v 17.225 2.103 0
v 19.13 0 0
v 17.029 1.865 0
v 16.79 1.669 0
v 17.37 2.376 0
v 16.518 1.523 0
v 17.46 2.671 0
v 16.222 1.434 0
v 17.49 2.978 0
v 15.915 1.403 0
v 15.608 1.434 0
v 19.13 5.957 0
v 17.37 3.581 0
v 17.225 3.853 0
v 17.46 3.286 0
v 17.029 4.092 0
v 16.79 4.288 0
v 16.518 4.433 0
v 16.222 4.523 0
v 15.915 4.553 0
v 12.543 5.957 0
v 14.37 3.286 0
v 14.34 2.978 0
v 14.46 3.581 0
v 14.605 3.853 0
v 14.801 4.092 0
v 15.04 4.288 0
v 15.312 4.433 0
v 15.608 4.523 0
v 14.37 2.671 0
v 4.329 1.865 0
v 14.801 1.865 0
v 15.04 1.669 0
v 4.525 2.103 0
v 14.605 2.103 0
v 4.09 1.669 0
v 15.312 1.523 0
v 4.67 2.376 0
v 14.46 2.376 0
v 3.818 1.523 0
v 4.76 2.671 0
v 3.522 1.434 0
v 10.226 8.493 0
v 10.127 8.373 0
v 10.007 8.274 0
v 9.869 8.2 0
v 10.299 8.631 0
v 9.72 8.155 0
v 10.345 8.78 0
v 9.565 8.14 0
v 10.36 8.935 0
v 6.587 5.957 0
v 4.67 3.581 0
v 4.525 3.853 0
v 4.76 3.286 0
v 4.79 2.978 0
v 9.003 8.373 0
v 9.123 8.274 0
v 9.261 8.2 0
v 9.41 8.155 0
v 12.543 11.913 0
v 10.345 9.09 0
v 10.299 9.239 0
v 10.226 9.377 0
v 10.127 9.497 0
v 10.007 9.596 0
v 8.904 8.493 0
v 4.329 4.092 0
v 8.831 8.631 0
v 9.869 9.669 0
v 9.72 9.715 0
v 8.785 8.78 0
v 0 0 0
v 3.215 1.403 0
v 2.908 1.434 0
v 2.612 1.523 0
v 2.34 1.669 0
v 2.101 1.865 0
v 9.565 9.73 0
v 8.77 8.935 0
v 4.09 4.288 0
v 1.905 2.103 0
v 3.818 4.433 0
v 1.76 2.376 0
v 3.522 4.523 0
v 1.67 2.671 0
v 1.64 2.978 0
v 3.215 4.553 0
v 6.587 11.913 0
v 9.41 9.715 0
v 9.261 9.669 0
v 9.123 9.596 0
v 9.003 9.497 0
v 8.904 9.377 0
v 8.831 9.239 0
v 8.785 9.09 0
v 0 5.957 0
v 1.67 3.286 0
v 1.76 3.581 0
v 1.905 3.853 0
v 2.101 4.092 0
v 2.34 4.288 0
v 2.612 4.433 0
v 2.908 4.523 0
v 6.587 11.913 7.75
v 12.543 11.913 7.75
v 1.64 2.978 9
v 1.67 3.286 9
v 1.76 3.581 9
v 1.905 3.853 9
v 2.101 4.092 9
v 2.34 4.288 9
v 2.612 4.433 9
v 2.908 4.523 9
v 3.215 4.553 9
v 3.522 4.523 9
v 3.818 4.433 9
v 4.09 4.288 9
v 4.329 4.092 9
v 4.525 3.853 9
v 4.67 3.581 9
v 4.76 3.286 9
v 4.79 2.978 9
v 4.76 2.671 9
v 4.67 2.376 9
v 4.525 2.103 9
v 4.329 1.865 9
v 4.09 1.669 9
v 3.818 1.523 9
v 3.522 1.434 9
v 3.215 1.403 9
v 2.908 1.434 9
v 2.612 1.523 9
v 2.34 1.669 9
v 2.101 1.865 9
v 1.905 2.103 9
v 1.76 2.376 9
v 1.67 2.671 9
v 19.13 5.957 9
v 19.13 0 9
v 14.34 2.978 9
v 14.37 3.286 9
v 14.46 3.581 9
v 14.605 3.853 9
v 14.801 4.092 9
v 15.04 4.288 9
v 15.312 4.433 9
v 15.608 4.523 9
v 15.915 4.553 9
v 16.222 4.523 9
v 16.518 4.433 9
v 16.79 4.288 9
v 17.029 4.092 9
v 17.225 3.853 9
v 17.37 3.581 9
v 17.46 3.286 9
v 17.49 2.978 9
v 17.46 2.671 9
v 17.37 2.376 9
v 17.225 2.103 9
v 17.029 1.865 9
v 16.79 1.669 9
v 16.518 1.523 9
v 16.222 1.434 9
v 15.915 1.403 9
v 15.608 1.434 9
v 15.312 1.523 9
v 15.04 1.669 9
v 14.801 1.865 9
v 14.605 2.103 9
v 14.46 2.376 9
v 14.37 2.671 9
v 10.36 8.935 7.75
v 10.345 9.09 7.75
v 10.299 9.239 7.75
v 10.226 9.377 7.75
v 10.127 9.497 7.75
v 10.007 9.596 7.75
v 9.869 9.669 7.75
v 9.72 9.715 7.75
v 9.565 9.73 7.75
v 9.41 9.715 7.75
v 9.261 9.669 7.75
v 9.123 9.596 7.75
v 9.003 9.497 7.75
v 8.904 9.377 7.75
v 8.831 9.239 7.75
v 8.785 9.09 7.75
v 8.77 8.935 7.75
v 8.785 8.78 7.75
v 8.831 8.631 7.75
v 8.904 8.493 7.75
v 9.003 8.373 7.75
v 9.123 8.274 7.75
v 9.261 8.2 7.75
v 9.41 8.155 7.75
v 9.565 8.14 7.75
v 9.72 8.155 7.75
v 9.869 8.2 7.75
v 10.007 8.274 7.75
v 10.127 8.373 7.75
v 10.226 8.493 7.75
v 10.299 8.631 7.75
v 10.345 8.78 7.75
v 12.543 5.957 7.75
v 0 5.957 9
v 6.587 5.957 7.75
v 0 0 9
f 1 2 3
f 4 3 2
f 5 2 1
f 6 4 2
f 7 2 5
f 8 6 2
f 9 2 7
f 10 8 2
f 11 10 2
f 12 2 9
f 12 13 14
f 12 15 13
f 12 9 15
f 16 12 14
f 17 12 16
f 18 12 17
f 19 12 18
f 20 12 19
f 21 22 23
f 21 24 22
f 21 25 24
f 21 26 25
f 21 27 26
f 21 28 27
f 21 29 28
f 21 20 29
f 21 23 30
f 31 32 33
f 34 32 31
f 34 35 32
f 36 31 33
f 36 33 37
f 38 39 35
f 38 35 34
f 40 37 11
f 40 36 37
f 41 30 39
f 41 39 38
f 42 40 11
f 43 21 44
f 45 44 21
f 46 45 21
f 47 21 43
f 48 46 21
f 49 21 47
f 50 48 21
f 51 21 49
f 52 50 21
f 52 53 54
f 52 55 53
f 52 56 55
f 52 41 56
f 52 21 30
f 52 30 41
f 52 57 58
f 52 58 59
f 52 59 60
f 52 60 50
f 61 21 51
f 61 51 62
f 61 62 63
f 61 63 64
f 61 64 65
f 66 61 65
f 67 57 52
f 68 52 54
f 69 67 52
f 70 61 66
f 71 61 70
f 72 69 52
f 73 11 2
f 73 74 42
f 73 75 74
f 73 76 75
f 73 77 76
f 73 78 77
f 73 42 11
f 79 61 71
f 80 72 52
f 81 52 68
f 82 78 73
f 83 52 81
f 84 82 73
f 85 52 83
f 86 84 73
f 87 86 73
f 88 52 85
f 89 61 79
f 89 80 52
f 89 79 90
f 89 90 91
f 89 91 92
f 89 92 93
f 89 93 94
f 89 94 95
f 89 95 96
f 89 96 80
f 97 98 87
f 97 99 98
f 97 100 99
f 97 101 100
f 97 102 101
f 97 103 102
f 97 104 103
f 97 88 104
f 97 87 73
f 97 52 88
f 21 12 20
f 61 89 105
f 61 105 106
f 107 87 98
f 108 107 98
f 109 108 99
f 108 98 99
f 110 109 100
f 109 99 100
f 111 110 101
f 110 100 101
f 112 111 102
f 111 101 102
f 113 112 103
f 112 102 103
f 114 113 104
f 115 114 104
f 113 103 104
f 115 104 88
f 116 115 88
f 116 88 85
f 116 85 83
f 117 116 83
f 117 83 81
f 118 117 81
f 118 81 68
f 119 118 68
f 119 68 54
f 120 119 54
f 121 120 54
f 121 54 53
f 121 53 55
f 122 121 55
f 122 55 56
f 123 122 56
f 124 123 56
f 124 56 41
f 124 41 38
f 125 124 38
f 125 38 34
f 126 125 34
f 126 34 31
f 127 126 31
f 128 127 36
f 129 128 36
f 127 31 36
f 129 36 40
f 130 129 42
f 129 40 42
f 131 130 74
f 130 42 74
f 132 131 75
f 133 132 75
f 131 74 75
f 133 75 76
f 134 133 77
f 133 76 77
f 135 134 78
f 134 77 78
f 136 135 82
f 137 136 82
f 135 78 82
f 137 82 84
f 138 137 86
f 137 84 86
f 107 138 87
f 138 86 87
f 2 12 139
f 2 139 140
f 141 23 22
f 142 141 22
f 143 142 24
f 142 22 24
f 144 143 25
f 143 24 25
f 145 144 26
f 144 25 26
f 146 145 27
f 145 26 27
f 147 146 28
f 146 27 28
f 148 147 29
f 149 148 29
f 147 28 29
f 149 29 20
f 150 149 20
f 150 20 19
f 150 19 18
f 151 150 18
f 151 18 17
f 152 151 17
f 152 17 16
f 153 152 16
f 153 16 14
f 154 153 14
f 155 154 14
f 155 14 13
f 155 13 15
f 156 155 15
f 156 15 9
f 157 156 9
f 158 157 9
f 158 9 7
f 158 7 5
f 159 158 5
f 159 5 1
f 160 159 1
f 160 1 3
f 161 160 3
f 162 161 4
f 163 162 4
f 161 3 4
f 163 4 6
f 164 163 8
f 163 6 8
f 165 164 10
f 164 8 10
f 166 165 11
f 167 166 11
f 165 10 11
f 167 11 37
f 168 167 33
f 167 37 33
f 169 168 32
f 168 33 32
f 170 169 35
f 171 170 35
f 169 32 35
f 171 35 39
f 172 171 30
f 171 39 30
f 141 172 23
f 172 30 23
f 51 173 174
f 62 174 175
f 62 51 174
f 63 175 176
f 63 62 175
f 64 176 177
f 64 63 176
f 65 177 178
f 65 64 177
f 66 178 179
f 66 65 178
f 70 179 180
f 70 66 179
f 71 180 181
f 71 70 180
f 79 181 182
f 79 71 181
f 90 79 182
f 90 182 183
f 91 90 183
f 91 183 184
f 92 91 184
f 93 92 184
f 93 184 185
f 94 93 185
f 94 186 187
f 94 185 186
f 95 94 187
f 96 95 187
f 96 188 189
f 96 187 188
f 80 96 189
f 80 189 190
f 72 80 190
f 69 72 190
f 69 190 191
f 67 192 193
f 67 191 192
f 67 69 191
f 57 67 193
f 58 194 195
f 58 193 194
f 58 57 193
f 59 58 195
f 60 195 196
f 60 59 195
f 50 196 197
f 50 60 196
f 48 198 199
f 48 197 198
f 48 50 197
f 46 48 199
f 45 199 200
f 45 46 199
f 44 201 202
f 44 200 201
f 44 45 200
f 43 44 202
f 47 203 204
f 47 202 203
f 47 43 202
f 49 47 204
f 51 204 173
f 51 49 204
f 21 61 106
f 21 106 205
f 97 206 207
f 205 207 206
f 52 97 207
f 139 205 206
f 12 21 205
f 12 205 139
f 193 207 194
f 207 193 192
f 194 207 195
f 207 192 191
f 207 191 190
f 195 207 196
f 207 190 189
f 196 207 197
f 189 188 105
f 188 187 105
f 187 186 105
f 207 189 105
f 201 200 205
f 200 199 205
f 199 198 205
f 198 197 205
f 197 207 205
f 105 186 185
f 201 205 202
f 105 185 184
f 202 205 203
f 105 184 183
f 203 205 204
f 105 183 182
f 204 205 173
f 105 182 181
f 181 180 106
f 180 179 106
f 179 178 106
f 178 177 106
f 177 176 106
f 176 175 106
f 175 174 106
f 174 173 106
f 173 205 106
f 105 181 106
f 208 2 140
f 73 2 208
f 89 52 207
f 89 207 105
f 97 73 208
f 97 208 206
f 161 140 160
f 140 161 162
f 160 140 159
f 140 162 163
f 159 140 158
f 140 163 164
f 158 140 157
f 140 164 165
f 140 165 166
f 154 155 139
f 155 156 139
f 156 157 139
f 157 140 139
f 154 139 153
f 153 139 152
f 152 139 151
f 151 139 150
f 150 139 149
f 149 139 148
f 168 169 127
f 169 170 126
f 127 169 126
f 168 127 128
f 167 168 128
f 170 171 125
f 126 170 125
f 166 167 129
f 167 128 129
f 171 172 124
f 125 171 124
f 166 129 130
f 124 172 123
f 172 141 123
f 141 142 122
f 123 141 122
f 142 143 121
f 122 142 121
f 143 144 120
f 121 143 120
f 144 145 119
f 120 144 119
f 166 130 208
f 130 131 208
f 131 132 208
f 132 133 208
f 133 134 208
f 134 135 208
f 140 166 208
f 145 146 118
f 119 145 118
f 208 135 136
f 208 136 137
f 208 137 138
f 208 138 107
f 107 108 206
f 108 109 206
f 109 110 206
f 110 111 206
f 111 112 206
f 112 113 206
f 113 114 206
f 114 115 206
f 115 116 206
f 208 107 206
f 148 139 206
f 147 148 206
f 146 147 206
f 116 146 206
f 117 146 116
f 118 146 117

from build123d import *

# Parameters (mm, degrees)
SKETCH1_R           = 0.795
BOSS_EXTRUDE1_DEPTH = 9
SKETCH4_W           = 1.25
SKETCH4_H           = 5.95656864
CUT_EXTRUDE2_DEPTH  = 13.54328432
SKETCH5_R           = 1.575
CUT_EXTRUDE3_DEPTH  = 10


with BuildPart() as part:
    # Sketch1 → Boss-Extrude1 (new body)
    with BuildSketch(Plane.XY):
        Polygon((0, 0), (0, 5.95656864), (6.58671568, 5.95656864), (6.58671568, 11.91313728), (12.54328432, 11.91313728), (12.54328432, 5.95656864), (19.13, 5.95656864), (19.13, 0), align=None)
        with Locations((9.565, 8.93485296)):
            Circle(SKETCH1_R, mode=Mode.SUBTRACT)
    extrude(amount=BOSS_EXTRUDE1_DEPTH)

    # Sketch4 → Cut-Extrude2 (cut, through all)
    with BuildSketch(Plane(origin=(12.54328432, 0, 0), x_dir=(0, 0, -1), z_dir=(1, 0, 0))):
        with Locations((-8.375, 8.93485296)):
            Rectangle(SKETCH4_W, SKETCH4_H)
    extrude(amount=-CUT_EXTRUDE2_DEPTH, mode=Mode.SUBTRACT)

    # Sketch5 → Cut-Extrude3 (cut, through all)
    with BuildSketch(Plane(origin=(0, 0, 0), x_dir=(-1, 0, 0), z_dir=(0, 0, -1))):
        with Locations((-3.215, 2.97828432)):
            Circle(SKETCH5_R)
        with Locations((-15.915, 2.97828432)):
            Circle(SKETCH5_R)
    extrude(amount=-CUT_EXTRUDE3_DEPTH, mode=Mode.SUBTRACT)


solid = part.part
